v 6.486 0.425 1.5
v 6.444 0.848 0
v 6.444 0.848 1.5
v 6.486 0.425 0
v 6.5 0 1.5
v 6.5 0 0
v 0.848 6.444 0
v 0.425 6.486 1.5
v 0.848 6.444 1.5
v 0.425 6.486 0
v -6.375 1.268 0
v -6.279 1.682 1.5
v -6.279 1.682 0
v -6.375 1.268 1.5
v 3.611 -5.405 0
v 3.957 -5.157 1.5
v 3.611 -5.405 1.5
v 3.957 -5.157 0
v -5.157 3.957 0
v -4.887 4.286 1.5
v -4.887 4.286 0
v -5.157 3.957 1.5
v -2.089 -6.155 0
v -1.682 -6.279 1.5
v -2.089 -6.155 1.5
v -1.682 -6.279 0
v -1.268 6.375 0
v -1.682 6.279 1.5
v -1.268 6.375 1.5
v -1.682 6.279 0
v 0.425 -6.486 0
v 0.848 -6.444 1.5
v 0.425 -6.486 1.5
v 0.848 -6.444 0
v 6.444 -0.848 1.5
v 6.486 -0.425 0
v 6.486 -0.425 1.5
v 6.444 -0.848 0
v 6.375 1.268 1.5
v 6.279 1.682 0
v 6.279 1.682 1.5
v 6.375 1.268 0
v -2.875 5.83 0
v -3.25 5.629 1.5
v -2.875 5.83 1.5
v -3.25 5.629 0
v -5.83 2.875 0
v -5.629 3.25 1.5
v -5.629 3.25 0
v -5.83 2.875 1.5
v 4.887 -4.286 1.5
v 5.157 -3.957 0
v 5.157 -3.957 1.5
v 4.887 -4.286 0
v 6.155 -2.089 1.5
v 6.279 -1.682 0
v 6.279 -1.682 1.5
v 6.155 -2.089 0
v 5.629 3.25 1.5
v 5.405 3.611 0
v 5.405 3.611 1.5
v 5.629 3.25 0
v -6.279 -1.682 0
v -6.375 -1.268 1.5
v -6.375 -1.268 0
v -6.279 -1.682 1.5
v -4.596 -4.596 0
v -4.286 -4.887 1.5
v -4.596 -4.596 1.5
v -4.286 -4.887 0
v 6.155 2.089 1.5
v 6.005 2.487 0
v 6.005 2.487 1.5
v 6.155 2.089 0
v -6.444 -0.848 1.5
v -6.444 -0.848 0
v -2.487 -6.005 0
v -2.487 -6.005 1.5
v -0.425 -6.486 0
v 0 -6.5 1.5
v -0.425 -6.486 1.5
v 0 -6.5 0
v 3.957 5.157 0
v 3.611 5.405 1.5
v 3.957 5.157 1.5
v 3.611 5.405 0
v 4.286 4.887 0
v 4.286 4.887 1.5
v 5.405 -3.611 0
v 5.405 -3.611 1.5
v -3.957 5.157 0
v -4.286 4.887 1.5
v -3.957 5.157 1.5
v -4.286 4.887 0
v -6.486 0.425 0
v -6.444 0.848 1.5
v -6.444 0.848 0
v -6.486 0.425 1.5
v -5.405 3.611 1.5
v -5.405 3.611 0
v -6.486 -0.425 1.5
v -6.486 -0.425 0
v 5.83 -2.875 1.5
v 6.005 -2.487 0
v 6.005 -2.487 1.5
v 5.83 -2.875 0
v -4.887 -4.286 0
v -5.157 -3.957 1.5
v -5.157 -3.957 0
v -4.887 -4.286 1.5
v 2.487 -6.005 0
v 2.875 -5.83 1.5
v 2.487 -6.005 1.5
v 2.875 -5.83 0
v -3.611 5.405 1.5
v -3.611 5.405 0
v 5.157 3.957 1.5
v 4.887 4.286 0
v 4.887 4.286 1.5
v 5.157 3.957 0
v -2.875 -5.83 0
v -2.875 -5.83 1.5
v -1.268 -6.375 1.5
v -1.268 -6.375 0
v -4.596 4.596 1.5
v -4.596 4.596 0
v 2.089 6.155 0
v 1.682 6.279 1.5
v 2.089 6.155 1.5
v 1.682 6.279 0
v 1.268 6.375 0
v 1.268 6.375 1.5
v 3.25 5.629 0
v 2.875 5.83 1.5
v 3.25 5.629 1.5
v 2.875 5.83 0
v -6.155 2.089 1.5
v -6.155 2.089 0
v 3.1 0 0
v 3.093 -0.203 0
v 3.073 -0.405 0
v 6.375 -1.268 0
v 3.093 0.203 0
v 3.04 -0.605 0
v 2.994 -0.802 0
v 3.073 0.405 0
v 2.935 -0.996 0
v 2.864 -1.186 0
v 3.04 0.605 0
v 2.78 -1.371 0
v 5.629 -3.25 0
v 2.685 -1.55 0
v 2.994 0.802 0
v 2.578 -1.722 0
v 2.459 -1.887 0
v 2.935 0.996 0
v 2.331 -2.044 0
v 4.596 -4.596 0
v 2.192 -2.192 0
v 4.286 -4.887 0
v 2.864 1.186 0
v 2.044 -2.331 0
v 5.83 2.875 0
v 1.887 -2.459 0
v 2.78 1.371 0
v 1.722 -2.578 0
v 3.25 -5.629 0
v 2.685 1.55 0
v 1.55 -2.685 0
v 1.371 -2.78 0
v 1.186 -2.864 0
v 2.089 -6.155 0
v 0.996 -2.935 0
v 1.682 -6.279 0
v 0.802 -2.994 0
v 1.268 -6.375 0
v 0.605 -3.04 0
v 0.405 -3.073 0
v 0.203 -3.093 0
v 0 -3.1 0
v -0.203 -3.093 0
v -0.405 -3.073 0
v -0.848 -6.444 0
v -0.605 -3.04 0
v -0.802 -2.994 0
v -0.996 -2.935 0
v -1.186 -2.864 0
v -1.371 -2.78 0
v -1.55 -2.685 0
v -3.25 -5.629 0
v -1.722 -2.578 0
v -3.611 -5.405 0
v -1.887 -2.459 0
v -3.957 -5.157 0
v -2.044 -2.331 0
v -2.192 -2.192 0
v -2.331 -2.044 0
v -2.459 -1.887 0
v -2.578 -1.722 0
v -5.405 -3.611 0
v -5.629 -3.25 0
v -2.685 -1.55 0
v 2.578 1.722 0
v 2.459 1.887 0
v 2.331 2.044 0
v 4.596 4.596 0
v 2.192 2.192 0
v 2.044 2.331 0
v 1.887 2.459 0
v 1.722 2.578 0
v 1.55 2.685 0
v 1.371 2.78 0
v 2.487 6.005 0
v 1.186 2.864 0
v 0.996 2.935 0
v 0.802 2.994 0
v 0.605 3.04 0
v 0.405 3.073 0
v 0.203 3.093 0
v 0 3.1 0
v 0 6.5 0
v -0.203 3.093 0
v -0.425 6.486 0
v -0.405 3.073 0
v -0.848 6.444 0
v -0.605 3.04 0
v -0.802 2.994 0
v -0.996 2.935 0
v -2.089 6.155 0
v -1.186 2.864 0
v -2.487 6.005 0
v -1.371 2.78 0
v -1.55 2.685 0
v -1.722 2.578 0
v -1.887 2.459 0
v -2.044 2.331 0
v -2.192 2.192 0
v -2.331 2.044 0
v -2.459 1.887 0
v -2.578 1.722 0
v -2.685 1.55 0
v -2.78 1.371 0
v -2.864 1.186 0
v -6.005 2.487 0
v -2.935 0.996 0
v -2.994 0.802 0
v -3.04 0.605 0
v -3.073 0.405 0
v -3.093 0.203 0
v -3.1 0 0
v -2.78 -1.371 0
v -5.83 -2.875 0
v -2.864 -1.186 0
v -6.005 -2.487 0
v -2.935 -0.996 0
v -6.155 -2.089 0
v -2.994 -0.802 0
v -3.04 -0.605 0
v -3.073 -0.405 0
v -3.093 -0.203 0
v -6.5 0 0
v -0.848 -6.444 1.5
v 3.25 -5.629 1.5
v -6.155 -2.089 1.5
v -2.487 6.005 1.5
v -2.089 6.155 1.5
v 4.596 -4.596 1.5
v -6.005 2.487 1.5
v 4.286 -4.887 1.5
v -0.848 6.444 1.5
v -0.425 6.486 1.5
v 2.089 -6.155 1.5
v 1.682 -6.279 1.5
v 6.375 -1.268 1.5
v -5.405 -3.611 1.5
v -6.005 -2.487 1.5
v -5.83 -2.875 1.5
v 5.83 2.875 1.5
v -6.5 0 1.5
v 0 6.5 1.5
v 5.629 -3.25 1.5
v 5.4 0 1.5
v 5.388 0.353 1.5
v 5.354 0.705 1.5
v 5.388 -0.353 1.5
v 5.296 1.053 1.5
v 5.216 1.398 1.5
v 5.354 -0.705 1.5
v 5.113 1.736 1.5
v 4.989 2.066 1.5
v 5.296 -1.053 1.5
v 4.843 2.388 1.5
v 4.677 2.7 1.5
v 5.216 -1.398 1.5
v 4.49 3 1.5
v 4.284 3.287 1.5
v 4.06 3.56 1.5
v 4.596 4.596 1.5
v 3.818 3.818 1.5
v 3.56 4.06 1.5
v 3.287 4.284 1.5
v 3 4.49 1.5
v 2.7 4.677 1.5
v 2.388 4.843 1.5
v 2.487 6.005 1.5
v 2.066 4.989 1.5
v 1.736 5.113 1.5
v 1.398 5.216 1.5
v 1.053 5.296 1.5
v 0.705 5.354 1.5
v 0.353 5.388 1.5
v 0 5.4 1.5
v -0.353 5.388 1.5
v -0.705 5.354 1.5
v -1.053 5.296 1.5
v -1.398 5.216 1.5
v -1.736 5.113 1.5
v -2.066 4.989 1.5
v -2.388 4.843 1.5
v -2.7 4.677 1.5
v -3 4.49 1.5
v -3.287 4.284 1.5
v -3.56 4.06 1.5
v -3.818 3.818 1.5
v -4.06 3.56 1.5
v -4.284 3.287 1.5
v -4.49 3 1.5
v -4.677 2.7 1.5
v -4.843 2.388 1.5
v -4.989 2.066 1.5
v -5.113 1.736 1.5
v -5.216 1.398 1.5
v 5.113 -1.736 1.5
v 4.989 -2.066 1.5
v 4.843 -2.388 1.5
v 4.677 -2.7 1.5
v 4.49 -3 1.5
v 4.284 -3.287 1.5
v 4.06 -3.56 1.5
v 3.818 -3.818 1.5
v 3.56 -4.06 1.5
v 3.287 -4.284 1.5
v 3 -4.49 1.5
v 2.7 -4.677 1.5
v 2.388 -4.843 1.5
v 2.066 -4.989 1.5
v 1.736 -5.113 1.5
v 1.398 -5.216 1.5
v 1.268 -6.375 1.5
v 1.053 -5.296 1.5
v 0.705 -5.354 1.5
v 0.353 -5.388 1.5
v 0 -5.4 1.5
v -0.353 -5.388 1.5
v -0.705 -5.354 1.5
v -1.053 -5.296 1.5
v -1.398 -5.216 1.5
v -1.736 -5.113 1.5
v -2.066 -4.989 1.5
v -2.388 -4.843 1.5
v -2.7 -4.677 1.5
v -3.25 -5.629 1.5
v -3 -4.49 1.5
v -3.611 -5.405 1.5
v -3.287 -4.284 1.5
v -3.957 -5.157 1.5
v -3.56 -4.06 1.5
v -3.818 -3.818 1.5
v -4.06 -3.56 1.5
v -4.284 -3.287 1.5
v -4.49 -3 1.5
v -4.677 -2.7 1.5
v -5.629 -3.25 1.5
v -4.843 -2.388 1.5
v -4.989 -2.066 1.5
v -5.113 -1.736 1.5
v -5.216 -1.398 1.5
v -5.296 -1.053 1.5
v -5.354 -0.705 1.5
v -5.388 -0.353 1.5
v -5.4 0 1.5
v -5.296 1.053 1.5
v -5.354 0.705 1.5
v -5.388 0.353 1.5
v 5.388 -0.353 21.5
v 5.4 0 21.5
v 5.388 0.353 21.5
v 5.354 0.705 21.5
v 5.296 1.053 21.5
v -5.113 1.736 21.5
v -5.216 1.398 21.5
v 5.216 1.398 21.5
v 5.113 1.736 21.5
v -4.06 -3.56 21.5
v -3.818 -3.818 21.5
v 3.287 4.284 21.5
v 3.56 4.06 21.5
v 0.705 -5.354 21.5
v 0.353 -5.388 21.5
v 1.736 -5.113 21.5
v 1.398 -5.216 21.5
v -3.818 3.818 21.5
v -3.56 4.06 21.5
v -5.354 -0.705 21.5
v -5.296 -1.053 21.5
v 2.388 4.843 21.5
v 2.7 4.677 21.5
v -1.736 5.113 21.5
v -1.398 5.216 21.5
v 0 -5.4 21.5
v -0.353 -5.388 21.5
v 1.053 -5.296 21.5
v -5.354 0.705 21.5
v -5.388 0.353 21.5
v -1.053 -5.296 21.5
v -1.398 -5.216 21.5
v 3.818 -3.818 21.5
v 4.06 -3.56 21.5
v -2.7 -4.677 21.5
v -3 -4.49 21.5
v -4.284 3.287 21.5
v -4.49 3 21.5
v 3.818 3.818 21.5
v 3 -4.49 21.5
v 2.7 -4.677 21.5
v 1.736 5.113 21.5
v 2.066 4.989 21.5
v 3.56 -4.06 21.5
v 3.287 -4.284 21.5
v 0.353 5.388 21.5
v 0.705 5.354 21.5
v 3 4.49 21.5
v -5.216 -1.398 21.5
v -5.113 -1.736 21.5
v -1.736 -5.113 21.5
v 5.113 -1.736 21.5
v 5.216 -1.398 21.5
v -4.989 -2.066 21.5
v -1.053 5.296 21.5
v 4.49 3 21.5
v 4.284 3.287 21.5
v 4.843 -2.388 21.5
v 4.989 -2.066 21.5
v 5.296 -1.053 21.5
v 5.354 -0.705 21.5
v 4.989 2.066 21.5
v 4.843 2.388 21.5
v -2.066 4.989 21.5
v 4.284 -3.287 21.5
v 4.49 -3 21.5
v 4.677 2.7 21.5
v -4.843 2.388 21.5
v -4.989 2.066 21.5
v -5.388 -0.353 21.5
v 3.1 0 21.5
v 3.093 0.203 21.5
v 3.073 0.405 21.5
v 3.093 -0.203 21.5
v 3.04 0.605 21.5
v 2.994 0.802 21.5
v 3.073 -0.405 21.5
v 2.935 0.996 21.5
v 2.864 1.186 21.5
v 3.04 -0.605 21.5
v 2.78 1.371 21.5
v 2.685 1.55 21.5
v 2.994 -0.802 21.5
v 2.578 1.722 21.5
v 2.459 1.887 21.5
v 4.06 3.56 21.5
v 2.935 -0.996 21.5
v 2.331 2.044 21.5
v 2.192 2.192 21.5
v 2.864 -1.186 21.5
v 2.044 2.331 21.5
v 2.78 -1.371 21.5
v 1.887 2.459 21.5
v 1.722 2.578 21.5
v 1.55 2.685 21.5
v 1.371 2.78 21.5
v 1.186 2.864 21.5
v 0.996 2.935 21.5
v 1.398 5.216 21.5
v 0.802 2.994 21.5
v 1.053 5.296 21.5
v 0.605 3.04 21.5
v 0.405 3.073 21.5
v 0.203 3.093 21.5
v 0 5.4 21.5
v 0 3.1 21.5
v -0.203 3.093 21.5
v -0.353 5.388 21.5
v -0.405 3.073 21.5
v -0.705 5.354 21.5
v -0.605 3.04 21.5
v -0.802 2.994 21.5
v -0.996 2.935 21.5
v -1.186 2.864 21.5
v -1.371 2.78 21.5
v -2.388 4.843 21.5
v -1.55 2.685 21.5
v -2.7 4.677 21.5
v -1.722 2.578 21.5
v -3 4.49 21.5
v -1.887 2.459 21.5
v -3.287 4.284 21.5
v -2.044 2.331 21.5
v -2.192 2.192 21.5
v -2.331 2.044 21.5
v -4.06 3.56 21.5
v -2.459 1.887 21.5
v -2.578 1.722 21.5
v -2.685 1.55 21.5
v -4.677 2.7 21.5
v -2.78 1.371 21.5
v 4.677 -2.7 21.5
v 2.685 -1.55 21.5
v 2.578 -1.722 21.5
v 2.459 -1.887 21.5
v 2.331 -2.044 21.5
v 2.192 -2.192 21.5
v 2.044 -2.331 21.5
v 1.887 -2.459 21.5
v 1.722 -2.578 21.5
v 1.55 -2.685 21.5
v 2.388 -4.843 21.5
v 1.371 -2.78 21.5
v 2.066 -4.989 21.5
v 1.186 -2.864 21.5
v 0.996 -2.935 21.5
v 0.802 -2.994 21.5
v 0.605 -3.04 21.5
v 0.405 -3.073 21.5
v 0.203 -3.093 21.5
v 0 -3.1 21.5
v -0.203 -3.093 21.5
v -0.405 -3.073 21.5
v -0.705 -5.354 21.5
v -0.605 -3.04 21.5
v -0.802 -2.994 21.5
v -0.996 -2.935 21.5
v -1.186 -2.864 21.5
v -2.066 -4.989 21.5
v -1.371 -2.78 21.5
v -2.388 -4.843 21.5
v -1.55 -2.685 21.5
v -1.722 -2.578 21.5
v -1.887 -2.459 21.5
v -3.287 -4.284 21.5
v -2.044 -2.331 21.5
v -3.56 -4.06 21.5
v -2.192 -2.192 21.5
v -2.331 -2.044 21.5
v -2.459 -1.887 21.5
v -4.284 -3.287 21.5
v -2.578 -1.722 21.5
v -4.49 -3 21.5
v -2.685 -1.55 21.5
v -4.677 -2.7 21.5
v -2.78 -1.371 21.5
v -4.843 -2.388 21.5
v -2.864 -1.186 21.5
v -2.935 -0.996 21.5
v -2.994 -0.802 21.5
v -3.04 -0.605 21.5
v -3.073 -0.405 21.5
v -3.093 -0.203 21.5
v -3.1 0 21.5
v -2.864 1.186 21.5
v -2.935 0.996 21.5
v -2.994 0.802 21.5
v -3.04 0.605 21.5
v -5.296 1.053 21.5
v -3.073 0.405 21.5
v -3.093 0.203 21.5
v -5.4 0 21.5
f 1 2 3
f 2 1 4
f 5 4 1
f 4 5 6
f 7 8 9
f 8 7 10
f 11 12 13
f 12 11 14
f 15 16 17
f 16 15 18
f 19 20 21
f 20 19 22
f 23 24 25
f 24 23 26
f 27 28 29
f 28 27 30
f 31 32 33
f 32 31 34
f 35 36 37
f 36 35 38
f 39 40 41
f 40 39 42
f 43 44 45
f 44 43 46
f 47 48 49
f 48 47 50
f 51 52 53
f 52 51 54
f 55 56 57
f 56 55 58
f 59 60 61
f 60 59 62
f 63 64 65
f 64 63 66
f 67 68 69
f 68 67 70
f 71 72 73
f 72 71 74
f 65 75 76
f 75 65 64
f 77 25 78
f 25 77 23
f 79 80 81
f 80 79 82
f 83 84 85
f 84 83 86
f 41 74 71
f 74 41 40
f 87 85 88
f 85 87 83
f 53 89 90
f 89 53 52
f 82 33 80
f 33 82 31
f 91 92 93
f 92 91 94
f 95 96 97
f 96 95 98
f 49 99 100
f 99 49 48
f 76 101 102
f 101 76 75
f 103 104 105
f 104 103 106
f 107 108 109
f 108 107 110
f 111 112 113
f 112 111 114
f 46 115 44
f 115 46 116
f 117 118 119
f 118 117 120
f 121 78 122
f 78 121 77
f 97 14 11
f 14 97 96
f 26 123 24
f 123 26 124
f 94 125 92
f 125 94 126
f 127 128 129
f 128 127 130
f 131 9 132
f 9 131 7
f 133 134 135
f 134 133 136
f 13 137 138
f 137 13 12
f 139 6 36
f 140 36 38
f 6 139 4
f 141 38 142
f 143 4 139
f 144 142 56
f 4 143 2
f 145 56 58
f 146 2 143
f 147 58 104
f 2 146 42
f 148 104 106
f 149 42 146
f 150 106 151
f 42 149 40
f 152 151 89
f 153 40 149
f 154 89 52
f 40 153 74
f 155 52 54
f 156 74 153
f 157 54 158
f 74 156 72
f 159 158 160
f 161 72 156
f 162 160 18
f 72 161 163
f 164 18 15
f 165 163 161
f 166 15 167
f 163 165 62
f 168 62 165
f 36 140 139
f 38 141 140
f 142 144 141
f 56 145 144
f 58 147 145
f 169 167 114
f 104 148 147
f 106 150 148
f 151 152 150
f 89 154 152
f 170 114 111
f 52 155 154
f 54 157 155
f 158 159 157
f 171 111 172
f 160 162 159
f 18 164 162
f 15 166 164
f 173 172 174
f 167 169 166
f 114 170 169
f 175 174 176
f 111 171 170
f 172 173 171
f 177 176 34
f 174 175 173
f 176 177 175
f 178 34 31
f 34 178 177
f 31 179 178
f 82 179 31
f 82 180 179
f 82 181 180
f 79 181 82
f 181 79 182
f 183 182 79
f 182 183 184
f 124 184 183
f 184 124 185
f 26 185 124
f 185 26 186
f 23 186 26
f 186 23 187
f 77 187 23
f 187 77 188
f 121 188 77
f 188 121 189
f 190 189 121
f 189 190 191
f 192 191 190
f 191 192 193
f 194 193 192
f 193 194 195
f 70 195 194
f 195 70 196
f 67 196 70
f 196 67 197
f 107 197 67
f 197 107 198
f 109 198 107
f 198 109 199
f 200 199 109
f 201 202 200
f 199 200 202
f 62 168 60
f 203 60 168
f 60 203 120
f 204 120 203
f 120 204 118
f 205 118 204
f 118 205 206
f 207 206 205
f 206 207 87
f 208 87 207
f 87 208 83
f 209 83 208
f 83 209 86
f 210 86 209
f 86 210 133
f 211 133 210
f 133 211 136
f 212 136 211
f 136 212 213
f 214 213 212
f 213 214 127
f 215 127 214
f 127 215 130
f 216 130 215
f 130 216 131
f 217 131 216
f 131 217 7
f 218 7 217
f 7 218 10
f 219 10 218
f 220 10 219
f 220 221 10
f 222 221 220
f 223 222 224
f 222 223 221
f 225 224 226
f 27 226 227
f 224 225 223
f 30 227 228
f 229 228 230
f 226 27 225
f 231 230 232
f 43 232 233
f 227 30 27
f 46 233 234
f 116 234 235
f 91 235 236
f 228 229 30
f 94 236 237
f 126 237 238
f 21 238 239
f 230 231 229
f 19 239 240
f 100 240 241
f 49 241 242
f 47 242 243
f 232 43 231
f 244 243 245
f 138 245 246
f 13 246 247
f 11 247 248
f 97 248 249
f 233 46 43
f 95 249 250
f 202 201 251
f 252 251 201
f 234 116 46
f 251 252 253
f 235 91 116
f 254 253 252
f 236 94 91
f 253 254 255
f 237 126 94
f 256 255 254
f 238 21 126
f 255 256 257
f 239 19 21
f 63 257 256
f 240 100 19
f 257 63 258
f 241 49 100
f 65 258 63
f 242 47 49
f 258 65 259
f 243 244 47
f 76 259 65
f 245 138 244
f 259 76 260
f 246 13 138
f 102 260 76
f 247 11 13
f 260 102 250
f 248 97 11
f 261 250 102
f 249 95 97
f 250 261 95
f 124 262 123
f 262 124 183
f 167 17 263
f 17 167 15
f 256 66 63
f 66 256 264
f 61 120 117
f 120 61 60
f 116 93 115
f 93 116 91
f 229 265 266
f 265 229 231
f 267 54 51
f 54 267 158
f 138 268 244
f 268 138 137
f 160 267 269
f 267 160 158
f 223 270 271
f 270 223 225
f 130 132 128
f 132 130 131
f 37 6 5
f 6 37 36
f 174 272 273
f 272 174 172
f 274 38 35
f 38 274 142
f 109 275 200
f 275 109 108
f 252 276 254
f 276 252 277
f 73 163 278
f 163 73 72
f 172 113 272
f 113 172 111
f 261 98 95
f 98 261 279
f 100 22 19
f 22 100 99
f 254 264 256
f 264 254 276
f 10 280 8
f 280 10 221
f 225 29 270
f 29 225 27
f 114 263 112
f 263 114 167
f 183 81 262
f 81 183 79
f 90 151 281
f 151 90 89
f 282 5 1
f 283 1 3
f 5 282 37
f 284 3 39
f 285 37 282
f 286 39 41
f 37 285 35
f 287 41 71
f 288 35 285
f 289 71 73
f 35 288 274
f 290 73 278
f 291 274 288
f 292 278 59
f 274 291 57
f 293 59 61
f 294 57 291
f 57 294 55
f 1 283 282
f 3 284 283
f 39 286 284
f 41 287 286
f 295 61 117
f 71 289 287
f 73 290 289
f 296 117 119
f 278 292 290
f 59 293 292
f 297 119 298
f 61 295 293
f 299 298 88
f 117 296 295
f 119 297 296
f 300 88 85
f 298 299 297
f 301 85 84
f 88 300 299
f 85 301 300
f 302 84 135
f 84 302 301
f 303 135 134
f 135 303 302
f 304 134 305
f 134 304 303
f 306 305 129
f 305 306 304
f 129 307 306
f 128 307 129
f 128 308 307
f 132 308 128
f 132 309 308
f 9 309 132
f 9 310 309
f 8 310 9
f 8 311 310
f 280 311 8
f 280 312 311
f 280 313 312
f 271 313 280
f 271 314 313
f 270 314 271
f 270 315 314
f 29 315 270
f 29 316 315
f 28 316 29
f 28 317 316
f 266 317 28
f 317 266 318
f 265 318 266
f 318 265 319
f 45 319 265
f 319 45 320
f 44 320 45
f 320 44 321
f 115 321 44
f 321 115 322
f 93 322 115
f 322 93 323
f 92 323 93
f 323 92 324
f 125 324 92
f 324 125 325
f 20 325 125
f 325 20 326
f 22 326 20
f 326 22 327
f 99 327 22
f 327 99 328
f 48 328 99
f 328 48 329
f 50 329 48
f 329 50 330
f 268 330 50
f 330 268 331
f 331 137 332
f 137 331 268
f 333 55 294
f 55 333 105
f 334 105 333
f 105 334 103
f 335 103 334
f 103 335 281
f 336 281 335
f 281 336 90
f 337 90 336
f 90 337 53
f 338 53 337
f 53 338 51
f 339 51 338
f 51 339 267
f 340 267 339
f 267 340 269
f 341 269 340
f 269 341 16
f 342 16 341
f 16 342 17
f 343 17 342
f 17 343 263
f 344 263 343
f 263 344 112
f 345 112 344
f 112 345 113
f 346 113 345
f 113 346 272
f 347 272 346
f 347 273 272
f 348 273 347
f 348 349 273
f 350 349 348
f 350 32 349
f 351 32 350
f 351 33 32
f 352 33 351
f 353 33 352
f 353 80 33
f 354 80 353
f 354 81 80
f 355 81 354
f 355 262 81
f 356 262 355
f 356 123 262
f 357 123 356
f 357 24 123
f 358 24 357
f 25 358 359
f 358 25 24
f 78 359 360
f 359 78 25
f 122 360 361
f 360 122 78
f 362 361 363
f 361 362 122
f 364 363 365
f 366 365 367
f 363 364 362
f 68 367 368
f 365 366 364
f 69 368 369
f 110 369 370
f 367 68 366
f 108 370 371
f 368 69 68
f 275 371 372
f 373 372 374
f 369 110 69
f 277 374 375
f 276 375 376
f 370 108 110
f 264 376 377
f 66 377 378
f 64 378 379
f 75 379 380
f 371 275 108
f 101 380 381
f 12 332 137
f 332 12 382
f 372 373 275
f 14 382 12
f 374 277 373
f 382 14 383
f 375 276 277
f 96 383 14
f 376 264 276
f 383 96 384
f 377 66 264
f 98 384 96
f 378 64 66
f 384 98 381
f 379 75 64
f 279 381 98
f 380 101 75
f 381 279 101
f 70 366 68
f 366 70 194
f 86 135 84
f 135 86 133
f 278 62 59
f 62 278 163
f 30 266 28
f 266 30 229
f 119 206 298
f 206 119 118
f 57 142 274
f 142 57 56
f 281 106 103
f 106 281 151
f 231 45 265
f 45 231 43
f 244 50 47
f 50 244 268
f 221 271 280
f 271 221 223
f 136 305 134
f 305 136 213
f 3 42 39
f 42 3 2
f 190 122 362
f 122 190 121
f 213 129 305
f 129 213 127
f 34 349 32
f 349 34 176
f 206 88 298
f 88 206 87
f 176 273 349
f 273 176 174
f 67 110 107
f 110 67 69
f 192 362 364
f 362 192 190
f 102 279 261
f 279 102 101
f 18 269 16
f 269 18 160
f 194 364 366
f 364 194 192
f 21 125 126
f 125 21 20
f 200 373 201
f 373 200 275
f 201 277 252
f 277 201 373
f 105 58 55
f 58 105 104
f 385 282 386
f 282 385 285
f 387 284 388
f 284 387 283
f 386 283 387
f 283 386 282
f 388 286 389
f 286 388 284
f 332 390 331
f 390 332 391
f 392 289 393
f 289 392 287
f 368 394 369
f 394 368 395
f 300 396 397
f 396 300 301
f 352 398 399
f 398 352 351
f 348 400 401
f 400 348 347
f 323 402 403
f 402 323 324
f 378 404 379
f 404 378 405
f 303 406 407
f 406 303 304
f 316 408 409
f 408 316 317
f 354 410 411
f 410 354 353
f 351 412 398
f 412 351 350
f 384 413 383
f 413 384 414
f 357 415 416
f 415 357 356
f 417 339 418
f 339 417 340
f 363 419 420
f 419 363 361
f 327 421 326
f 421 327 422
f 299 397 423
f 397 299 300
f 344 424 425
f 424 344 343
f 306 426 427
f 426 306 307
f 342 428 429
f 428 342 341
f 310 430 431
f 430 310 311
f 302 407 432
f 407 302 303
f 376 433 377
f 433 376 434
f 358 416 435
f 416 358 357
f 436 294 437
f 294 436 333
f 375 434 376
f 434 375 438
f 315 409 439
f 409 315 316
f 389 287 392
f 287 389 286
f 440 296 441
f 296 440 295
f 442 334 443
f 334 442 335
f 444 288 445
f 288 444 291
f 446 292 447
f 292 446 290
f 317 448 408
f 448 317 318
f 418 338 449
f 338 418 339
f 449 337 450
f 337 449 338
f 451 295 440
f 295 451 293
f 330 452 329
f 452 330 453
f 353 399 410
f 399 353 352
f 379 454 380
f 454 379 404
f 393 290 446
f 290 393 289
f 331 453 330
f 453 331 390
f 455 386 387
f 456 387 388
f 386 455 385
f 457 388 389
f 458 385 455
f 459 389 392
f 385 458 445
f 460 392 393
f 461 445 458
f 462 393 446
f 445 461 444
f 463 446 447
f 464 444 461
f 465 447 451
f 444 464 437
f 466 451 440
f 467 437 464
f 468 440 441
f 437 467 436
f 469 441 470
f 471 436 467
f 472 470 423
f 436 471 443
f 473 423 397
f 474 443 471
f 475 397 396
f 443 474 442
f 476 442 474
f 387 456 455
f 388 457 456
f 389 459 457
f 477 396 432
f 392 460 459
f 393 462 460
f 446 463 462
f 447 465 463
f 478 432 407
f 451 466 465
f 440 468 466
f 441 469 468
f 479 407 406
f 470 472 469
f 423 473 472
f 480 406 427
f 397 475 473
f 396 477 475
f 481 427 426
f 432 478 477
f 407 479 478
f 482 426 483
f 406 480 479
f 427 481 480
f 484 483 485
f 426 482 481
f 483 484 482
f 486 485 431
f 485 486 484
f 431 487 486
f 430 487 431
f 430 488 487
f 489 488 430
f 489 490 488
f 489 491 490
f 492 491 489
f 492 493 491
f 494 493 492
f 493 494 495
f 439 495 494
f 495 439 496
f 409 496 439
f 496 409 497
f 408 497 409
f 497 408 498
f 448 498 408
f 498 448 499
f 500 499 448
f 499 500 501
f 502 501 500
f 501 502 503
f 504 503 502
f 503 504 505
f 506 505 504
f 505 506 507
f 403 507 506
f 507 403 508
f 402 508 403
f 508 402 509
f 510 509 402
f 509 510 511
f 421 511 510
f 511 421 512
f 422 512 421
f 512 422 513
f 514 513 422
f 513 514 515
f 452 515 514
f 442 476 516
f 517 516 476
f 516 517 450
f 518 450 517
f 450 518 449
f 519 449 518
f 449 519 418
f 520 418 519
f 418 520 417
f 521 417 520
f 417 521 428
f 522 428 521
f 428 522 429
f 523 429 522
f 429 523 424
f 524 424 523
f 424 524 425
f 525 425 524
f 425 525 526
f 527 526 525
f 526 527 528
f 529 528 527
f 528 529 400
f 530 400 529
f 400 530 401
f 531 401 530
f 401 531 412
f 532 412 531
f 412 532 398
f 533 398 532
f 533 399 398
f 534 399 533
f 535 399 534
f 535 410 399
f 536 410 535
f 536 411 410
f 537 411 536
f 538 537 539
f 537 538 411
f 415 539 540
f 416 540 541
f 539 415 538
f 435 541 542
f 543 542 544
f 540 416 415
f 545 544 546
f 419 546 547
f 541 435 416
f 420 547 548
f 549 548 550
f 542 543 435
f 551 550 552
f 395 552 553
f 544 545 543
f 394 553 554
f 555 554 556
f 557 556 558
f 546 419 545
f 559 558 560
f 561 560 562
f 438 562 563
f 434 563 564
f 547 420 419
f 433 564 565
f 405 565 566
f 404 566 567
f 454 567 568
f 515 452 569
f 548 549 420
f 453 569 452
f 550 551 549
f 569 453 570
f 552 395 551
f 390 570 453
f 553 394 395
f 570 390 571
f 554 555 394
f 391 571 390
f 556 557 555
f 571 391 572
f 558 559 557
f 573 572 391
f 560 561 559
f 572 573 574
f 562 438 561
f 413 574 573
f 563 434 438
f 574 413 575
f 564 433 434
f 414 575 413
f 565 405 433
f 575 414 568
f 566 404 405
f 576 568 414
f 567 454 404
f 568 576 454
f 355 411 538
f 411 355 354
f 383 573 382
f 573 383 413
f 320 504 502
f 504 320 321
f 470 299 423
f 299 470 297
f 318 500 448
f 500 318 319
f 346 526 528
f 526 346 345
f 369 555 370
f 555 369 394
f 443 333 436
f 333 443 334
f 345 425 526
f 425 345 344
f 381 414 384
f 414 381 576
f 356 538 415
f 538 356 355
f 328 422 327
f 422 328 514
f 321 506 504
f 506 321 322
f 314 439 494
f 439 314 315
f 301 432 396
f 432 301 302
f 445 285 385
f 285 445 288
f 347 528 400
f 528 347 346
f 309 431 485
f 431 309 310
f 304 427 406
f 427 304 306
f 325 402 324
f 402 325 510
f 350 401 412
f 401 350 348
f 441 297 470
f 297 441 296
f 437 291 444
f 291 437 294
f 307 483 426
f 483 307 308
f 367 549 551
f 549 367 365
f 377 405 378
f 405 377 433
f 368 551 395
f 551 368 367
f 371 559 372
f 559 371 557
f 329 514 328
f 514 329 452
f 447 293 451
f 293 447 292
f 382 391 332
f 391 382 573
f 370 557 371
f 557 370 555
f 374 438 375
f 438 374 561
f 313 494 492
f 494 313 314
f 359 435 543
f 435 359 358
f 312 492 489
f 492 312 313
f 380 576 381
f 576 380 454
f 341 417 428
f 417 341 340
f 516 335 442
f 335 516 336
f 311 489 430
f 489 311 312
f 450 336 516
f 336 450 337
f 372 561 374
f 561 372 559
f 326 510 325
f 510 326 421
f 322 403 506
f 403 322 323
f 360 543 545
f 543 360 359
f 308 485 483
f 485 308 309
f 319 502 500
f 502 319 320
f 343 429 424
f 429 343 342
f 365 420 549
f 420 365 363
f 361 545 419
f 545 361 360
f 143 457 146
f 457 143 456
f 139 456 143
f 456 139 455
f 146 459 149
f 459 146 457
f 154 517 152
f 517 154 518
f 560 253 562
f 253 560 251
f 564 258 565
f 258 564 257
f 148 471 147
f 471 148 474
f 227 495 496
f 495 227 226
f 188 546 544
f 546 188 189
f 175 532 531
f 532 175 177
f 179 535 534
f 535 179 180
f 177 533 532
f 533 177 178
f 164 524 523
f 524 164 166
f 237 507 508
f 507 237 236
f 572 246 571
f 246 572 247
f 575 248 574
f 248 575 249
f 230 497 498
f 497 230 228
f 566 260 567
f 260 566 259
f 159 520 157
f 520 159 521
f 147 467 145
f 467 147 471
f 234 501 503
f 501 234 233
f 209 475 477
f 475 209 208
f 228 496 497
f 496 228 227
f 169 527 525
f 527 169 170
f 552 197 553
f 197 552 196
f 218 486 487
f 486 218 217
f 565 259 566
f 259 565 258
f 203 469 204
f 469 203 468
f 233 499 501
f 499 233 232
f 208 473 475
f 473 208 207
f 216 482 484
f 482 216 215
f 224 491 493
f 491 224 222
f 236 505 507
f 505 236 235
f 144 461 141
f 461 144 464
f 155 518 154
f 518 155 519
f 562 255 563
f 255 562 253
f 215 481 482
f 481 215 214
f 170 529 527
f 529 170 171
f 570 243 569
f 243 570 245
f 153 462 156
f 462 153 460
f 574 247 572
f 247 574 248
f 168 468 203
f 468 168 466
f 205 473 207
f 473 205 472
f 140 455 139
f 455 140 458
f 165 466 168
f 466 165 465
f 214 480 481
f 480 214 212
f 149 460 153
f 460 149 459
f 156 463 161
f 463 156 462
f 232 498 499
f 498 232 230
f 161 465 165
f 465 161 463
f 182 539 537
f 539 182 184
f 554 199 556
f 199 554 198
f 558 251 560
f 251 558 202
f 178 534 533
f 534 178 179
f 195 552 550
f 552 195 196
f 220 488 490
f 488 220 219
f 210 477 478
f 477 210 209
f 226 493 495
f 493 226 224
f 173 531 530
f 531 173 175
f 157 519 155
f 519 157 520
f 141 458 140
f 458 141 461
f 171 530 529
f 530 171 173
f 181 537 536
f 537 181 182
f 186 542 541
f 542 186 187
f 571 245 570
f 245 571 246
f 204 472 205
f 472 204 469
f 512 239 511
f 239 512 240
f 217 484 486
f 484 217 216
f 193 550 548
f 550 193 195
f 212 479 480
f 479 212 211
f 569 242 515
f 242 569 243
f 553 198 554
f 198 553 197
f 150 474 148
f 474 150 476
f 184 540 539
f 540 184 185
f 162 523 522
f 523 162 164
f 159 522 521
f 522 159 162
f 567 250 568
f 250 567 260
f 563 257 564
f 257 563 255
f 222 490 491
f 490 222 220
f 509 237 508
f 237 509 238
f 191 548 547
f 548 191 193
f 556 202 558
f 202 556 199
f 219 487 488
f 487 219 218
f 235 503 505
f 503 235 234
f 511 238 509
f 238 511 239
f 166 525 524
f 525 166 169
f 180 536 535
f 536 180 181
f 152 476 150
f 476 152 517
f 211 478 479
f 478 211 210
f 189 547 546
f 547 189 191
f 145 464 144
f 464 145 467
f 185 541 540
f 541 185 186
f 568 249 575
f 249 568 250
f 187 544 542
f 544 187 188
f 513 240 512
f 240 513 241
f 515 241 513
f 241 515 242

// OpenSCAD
// PCR tube adapter sleeve: fits 0.2 mL tube into a 1.5 mL rack hole
// Print orientation: collar on bed (z = 0), sleeve body rises to z = 21.5

// ---- Dimensions (mm) ----
collar_d        = 13;    // collar outer diameter
collar_h        = 1.5;   // collar thickness
sleeve_od       = 10.8;  // sleeve body outer diameter
sleeve_id       = 6.2;   // through-bore diameter
sleeve_top_z    = 21.5;  // top of sleeve body
eps             = 0.5;   // cutter overshoot past faces

$fn = 96;

difference() {
    union() {
        // Collar
        cylinder(d = collar_d, h = collar_h);
        // Sleeve body (from collar top to specified height)
        translate([0, 0, collar_h])
            cylinder(d = sleeve_od, h = sleeve_top_z - collar_h);
    }
    // Full-height bore
    translate([0, 0, -eps])
        cylinder(d = sleeve_id, h = sleeve_top_z + 2 * eps);
}
